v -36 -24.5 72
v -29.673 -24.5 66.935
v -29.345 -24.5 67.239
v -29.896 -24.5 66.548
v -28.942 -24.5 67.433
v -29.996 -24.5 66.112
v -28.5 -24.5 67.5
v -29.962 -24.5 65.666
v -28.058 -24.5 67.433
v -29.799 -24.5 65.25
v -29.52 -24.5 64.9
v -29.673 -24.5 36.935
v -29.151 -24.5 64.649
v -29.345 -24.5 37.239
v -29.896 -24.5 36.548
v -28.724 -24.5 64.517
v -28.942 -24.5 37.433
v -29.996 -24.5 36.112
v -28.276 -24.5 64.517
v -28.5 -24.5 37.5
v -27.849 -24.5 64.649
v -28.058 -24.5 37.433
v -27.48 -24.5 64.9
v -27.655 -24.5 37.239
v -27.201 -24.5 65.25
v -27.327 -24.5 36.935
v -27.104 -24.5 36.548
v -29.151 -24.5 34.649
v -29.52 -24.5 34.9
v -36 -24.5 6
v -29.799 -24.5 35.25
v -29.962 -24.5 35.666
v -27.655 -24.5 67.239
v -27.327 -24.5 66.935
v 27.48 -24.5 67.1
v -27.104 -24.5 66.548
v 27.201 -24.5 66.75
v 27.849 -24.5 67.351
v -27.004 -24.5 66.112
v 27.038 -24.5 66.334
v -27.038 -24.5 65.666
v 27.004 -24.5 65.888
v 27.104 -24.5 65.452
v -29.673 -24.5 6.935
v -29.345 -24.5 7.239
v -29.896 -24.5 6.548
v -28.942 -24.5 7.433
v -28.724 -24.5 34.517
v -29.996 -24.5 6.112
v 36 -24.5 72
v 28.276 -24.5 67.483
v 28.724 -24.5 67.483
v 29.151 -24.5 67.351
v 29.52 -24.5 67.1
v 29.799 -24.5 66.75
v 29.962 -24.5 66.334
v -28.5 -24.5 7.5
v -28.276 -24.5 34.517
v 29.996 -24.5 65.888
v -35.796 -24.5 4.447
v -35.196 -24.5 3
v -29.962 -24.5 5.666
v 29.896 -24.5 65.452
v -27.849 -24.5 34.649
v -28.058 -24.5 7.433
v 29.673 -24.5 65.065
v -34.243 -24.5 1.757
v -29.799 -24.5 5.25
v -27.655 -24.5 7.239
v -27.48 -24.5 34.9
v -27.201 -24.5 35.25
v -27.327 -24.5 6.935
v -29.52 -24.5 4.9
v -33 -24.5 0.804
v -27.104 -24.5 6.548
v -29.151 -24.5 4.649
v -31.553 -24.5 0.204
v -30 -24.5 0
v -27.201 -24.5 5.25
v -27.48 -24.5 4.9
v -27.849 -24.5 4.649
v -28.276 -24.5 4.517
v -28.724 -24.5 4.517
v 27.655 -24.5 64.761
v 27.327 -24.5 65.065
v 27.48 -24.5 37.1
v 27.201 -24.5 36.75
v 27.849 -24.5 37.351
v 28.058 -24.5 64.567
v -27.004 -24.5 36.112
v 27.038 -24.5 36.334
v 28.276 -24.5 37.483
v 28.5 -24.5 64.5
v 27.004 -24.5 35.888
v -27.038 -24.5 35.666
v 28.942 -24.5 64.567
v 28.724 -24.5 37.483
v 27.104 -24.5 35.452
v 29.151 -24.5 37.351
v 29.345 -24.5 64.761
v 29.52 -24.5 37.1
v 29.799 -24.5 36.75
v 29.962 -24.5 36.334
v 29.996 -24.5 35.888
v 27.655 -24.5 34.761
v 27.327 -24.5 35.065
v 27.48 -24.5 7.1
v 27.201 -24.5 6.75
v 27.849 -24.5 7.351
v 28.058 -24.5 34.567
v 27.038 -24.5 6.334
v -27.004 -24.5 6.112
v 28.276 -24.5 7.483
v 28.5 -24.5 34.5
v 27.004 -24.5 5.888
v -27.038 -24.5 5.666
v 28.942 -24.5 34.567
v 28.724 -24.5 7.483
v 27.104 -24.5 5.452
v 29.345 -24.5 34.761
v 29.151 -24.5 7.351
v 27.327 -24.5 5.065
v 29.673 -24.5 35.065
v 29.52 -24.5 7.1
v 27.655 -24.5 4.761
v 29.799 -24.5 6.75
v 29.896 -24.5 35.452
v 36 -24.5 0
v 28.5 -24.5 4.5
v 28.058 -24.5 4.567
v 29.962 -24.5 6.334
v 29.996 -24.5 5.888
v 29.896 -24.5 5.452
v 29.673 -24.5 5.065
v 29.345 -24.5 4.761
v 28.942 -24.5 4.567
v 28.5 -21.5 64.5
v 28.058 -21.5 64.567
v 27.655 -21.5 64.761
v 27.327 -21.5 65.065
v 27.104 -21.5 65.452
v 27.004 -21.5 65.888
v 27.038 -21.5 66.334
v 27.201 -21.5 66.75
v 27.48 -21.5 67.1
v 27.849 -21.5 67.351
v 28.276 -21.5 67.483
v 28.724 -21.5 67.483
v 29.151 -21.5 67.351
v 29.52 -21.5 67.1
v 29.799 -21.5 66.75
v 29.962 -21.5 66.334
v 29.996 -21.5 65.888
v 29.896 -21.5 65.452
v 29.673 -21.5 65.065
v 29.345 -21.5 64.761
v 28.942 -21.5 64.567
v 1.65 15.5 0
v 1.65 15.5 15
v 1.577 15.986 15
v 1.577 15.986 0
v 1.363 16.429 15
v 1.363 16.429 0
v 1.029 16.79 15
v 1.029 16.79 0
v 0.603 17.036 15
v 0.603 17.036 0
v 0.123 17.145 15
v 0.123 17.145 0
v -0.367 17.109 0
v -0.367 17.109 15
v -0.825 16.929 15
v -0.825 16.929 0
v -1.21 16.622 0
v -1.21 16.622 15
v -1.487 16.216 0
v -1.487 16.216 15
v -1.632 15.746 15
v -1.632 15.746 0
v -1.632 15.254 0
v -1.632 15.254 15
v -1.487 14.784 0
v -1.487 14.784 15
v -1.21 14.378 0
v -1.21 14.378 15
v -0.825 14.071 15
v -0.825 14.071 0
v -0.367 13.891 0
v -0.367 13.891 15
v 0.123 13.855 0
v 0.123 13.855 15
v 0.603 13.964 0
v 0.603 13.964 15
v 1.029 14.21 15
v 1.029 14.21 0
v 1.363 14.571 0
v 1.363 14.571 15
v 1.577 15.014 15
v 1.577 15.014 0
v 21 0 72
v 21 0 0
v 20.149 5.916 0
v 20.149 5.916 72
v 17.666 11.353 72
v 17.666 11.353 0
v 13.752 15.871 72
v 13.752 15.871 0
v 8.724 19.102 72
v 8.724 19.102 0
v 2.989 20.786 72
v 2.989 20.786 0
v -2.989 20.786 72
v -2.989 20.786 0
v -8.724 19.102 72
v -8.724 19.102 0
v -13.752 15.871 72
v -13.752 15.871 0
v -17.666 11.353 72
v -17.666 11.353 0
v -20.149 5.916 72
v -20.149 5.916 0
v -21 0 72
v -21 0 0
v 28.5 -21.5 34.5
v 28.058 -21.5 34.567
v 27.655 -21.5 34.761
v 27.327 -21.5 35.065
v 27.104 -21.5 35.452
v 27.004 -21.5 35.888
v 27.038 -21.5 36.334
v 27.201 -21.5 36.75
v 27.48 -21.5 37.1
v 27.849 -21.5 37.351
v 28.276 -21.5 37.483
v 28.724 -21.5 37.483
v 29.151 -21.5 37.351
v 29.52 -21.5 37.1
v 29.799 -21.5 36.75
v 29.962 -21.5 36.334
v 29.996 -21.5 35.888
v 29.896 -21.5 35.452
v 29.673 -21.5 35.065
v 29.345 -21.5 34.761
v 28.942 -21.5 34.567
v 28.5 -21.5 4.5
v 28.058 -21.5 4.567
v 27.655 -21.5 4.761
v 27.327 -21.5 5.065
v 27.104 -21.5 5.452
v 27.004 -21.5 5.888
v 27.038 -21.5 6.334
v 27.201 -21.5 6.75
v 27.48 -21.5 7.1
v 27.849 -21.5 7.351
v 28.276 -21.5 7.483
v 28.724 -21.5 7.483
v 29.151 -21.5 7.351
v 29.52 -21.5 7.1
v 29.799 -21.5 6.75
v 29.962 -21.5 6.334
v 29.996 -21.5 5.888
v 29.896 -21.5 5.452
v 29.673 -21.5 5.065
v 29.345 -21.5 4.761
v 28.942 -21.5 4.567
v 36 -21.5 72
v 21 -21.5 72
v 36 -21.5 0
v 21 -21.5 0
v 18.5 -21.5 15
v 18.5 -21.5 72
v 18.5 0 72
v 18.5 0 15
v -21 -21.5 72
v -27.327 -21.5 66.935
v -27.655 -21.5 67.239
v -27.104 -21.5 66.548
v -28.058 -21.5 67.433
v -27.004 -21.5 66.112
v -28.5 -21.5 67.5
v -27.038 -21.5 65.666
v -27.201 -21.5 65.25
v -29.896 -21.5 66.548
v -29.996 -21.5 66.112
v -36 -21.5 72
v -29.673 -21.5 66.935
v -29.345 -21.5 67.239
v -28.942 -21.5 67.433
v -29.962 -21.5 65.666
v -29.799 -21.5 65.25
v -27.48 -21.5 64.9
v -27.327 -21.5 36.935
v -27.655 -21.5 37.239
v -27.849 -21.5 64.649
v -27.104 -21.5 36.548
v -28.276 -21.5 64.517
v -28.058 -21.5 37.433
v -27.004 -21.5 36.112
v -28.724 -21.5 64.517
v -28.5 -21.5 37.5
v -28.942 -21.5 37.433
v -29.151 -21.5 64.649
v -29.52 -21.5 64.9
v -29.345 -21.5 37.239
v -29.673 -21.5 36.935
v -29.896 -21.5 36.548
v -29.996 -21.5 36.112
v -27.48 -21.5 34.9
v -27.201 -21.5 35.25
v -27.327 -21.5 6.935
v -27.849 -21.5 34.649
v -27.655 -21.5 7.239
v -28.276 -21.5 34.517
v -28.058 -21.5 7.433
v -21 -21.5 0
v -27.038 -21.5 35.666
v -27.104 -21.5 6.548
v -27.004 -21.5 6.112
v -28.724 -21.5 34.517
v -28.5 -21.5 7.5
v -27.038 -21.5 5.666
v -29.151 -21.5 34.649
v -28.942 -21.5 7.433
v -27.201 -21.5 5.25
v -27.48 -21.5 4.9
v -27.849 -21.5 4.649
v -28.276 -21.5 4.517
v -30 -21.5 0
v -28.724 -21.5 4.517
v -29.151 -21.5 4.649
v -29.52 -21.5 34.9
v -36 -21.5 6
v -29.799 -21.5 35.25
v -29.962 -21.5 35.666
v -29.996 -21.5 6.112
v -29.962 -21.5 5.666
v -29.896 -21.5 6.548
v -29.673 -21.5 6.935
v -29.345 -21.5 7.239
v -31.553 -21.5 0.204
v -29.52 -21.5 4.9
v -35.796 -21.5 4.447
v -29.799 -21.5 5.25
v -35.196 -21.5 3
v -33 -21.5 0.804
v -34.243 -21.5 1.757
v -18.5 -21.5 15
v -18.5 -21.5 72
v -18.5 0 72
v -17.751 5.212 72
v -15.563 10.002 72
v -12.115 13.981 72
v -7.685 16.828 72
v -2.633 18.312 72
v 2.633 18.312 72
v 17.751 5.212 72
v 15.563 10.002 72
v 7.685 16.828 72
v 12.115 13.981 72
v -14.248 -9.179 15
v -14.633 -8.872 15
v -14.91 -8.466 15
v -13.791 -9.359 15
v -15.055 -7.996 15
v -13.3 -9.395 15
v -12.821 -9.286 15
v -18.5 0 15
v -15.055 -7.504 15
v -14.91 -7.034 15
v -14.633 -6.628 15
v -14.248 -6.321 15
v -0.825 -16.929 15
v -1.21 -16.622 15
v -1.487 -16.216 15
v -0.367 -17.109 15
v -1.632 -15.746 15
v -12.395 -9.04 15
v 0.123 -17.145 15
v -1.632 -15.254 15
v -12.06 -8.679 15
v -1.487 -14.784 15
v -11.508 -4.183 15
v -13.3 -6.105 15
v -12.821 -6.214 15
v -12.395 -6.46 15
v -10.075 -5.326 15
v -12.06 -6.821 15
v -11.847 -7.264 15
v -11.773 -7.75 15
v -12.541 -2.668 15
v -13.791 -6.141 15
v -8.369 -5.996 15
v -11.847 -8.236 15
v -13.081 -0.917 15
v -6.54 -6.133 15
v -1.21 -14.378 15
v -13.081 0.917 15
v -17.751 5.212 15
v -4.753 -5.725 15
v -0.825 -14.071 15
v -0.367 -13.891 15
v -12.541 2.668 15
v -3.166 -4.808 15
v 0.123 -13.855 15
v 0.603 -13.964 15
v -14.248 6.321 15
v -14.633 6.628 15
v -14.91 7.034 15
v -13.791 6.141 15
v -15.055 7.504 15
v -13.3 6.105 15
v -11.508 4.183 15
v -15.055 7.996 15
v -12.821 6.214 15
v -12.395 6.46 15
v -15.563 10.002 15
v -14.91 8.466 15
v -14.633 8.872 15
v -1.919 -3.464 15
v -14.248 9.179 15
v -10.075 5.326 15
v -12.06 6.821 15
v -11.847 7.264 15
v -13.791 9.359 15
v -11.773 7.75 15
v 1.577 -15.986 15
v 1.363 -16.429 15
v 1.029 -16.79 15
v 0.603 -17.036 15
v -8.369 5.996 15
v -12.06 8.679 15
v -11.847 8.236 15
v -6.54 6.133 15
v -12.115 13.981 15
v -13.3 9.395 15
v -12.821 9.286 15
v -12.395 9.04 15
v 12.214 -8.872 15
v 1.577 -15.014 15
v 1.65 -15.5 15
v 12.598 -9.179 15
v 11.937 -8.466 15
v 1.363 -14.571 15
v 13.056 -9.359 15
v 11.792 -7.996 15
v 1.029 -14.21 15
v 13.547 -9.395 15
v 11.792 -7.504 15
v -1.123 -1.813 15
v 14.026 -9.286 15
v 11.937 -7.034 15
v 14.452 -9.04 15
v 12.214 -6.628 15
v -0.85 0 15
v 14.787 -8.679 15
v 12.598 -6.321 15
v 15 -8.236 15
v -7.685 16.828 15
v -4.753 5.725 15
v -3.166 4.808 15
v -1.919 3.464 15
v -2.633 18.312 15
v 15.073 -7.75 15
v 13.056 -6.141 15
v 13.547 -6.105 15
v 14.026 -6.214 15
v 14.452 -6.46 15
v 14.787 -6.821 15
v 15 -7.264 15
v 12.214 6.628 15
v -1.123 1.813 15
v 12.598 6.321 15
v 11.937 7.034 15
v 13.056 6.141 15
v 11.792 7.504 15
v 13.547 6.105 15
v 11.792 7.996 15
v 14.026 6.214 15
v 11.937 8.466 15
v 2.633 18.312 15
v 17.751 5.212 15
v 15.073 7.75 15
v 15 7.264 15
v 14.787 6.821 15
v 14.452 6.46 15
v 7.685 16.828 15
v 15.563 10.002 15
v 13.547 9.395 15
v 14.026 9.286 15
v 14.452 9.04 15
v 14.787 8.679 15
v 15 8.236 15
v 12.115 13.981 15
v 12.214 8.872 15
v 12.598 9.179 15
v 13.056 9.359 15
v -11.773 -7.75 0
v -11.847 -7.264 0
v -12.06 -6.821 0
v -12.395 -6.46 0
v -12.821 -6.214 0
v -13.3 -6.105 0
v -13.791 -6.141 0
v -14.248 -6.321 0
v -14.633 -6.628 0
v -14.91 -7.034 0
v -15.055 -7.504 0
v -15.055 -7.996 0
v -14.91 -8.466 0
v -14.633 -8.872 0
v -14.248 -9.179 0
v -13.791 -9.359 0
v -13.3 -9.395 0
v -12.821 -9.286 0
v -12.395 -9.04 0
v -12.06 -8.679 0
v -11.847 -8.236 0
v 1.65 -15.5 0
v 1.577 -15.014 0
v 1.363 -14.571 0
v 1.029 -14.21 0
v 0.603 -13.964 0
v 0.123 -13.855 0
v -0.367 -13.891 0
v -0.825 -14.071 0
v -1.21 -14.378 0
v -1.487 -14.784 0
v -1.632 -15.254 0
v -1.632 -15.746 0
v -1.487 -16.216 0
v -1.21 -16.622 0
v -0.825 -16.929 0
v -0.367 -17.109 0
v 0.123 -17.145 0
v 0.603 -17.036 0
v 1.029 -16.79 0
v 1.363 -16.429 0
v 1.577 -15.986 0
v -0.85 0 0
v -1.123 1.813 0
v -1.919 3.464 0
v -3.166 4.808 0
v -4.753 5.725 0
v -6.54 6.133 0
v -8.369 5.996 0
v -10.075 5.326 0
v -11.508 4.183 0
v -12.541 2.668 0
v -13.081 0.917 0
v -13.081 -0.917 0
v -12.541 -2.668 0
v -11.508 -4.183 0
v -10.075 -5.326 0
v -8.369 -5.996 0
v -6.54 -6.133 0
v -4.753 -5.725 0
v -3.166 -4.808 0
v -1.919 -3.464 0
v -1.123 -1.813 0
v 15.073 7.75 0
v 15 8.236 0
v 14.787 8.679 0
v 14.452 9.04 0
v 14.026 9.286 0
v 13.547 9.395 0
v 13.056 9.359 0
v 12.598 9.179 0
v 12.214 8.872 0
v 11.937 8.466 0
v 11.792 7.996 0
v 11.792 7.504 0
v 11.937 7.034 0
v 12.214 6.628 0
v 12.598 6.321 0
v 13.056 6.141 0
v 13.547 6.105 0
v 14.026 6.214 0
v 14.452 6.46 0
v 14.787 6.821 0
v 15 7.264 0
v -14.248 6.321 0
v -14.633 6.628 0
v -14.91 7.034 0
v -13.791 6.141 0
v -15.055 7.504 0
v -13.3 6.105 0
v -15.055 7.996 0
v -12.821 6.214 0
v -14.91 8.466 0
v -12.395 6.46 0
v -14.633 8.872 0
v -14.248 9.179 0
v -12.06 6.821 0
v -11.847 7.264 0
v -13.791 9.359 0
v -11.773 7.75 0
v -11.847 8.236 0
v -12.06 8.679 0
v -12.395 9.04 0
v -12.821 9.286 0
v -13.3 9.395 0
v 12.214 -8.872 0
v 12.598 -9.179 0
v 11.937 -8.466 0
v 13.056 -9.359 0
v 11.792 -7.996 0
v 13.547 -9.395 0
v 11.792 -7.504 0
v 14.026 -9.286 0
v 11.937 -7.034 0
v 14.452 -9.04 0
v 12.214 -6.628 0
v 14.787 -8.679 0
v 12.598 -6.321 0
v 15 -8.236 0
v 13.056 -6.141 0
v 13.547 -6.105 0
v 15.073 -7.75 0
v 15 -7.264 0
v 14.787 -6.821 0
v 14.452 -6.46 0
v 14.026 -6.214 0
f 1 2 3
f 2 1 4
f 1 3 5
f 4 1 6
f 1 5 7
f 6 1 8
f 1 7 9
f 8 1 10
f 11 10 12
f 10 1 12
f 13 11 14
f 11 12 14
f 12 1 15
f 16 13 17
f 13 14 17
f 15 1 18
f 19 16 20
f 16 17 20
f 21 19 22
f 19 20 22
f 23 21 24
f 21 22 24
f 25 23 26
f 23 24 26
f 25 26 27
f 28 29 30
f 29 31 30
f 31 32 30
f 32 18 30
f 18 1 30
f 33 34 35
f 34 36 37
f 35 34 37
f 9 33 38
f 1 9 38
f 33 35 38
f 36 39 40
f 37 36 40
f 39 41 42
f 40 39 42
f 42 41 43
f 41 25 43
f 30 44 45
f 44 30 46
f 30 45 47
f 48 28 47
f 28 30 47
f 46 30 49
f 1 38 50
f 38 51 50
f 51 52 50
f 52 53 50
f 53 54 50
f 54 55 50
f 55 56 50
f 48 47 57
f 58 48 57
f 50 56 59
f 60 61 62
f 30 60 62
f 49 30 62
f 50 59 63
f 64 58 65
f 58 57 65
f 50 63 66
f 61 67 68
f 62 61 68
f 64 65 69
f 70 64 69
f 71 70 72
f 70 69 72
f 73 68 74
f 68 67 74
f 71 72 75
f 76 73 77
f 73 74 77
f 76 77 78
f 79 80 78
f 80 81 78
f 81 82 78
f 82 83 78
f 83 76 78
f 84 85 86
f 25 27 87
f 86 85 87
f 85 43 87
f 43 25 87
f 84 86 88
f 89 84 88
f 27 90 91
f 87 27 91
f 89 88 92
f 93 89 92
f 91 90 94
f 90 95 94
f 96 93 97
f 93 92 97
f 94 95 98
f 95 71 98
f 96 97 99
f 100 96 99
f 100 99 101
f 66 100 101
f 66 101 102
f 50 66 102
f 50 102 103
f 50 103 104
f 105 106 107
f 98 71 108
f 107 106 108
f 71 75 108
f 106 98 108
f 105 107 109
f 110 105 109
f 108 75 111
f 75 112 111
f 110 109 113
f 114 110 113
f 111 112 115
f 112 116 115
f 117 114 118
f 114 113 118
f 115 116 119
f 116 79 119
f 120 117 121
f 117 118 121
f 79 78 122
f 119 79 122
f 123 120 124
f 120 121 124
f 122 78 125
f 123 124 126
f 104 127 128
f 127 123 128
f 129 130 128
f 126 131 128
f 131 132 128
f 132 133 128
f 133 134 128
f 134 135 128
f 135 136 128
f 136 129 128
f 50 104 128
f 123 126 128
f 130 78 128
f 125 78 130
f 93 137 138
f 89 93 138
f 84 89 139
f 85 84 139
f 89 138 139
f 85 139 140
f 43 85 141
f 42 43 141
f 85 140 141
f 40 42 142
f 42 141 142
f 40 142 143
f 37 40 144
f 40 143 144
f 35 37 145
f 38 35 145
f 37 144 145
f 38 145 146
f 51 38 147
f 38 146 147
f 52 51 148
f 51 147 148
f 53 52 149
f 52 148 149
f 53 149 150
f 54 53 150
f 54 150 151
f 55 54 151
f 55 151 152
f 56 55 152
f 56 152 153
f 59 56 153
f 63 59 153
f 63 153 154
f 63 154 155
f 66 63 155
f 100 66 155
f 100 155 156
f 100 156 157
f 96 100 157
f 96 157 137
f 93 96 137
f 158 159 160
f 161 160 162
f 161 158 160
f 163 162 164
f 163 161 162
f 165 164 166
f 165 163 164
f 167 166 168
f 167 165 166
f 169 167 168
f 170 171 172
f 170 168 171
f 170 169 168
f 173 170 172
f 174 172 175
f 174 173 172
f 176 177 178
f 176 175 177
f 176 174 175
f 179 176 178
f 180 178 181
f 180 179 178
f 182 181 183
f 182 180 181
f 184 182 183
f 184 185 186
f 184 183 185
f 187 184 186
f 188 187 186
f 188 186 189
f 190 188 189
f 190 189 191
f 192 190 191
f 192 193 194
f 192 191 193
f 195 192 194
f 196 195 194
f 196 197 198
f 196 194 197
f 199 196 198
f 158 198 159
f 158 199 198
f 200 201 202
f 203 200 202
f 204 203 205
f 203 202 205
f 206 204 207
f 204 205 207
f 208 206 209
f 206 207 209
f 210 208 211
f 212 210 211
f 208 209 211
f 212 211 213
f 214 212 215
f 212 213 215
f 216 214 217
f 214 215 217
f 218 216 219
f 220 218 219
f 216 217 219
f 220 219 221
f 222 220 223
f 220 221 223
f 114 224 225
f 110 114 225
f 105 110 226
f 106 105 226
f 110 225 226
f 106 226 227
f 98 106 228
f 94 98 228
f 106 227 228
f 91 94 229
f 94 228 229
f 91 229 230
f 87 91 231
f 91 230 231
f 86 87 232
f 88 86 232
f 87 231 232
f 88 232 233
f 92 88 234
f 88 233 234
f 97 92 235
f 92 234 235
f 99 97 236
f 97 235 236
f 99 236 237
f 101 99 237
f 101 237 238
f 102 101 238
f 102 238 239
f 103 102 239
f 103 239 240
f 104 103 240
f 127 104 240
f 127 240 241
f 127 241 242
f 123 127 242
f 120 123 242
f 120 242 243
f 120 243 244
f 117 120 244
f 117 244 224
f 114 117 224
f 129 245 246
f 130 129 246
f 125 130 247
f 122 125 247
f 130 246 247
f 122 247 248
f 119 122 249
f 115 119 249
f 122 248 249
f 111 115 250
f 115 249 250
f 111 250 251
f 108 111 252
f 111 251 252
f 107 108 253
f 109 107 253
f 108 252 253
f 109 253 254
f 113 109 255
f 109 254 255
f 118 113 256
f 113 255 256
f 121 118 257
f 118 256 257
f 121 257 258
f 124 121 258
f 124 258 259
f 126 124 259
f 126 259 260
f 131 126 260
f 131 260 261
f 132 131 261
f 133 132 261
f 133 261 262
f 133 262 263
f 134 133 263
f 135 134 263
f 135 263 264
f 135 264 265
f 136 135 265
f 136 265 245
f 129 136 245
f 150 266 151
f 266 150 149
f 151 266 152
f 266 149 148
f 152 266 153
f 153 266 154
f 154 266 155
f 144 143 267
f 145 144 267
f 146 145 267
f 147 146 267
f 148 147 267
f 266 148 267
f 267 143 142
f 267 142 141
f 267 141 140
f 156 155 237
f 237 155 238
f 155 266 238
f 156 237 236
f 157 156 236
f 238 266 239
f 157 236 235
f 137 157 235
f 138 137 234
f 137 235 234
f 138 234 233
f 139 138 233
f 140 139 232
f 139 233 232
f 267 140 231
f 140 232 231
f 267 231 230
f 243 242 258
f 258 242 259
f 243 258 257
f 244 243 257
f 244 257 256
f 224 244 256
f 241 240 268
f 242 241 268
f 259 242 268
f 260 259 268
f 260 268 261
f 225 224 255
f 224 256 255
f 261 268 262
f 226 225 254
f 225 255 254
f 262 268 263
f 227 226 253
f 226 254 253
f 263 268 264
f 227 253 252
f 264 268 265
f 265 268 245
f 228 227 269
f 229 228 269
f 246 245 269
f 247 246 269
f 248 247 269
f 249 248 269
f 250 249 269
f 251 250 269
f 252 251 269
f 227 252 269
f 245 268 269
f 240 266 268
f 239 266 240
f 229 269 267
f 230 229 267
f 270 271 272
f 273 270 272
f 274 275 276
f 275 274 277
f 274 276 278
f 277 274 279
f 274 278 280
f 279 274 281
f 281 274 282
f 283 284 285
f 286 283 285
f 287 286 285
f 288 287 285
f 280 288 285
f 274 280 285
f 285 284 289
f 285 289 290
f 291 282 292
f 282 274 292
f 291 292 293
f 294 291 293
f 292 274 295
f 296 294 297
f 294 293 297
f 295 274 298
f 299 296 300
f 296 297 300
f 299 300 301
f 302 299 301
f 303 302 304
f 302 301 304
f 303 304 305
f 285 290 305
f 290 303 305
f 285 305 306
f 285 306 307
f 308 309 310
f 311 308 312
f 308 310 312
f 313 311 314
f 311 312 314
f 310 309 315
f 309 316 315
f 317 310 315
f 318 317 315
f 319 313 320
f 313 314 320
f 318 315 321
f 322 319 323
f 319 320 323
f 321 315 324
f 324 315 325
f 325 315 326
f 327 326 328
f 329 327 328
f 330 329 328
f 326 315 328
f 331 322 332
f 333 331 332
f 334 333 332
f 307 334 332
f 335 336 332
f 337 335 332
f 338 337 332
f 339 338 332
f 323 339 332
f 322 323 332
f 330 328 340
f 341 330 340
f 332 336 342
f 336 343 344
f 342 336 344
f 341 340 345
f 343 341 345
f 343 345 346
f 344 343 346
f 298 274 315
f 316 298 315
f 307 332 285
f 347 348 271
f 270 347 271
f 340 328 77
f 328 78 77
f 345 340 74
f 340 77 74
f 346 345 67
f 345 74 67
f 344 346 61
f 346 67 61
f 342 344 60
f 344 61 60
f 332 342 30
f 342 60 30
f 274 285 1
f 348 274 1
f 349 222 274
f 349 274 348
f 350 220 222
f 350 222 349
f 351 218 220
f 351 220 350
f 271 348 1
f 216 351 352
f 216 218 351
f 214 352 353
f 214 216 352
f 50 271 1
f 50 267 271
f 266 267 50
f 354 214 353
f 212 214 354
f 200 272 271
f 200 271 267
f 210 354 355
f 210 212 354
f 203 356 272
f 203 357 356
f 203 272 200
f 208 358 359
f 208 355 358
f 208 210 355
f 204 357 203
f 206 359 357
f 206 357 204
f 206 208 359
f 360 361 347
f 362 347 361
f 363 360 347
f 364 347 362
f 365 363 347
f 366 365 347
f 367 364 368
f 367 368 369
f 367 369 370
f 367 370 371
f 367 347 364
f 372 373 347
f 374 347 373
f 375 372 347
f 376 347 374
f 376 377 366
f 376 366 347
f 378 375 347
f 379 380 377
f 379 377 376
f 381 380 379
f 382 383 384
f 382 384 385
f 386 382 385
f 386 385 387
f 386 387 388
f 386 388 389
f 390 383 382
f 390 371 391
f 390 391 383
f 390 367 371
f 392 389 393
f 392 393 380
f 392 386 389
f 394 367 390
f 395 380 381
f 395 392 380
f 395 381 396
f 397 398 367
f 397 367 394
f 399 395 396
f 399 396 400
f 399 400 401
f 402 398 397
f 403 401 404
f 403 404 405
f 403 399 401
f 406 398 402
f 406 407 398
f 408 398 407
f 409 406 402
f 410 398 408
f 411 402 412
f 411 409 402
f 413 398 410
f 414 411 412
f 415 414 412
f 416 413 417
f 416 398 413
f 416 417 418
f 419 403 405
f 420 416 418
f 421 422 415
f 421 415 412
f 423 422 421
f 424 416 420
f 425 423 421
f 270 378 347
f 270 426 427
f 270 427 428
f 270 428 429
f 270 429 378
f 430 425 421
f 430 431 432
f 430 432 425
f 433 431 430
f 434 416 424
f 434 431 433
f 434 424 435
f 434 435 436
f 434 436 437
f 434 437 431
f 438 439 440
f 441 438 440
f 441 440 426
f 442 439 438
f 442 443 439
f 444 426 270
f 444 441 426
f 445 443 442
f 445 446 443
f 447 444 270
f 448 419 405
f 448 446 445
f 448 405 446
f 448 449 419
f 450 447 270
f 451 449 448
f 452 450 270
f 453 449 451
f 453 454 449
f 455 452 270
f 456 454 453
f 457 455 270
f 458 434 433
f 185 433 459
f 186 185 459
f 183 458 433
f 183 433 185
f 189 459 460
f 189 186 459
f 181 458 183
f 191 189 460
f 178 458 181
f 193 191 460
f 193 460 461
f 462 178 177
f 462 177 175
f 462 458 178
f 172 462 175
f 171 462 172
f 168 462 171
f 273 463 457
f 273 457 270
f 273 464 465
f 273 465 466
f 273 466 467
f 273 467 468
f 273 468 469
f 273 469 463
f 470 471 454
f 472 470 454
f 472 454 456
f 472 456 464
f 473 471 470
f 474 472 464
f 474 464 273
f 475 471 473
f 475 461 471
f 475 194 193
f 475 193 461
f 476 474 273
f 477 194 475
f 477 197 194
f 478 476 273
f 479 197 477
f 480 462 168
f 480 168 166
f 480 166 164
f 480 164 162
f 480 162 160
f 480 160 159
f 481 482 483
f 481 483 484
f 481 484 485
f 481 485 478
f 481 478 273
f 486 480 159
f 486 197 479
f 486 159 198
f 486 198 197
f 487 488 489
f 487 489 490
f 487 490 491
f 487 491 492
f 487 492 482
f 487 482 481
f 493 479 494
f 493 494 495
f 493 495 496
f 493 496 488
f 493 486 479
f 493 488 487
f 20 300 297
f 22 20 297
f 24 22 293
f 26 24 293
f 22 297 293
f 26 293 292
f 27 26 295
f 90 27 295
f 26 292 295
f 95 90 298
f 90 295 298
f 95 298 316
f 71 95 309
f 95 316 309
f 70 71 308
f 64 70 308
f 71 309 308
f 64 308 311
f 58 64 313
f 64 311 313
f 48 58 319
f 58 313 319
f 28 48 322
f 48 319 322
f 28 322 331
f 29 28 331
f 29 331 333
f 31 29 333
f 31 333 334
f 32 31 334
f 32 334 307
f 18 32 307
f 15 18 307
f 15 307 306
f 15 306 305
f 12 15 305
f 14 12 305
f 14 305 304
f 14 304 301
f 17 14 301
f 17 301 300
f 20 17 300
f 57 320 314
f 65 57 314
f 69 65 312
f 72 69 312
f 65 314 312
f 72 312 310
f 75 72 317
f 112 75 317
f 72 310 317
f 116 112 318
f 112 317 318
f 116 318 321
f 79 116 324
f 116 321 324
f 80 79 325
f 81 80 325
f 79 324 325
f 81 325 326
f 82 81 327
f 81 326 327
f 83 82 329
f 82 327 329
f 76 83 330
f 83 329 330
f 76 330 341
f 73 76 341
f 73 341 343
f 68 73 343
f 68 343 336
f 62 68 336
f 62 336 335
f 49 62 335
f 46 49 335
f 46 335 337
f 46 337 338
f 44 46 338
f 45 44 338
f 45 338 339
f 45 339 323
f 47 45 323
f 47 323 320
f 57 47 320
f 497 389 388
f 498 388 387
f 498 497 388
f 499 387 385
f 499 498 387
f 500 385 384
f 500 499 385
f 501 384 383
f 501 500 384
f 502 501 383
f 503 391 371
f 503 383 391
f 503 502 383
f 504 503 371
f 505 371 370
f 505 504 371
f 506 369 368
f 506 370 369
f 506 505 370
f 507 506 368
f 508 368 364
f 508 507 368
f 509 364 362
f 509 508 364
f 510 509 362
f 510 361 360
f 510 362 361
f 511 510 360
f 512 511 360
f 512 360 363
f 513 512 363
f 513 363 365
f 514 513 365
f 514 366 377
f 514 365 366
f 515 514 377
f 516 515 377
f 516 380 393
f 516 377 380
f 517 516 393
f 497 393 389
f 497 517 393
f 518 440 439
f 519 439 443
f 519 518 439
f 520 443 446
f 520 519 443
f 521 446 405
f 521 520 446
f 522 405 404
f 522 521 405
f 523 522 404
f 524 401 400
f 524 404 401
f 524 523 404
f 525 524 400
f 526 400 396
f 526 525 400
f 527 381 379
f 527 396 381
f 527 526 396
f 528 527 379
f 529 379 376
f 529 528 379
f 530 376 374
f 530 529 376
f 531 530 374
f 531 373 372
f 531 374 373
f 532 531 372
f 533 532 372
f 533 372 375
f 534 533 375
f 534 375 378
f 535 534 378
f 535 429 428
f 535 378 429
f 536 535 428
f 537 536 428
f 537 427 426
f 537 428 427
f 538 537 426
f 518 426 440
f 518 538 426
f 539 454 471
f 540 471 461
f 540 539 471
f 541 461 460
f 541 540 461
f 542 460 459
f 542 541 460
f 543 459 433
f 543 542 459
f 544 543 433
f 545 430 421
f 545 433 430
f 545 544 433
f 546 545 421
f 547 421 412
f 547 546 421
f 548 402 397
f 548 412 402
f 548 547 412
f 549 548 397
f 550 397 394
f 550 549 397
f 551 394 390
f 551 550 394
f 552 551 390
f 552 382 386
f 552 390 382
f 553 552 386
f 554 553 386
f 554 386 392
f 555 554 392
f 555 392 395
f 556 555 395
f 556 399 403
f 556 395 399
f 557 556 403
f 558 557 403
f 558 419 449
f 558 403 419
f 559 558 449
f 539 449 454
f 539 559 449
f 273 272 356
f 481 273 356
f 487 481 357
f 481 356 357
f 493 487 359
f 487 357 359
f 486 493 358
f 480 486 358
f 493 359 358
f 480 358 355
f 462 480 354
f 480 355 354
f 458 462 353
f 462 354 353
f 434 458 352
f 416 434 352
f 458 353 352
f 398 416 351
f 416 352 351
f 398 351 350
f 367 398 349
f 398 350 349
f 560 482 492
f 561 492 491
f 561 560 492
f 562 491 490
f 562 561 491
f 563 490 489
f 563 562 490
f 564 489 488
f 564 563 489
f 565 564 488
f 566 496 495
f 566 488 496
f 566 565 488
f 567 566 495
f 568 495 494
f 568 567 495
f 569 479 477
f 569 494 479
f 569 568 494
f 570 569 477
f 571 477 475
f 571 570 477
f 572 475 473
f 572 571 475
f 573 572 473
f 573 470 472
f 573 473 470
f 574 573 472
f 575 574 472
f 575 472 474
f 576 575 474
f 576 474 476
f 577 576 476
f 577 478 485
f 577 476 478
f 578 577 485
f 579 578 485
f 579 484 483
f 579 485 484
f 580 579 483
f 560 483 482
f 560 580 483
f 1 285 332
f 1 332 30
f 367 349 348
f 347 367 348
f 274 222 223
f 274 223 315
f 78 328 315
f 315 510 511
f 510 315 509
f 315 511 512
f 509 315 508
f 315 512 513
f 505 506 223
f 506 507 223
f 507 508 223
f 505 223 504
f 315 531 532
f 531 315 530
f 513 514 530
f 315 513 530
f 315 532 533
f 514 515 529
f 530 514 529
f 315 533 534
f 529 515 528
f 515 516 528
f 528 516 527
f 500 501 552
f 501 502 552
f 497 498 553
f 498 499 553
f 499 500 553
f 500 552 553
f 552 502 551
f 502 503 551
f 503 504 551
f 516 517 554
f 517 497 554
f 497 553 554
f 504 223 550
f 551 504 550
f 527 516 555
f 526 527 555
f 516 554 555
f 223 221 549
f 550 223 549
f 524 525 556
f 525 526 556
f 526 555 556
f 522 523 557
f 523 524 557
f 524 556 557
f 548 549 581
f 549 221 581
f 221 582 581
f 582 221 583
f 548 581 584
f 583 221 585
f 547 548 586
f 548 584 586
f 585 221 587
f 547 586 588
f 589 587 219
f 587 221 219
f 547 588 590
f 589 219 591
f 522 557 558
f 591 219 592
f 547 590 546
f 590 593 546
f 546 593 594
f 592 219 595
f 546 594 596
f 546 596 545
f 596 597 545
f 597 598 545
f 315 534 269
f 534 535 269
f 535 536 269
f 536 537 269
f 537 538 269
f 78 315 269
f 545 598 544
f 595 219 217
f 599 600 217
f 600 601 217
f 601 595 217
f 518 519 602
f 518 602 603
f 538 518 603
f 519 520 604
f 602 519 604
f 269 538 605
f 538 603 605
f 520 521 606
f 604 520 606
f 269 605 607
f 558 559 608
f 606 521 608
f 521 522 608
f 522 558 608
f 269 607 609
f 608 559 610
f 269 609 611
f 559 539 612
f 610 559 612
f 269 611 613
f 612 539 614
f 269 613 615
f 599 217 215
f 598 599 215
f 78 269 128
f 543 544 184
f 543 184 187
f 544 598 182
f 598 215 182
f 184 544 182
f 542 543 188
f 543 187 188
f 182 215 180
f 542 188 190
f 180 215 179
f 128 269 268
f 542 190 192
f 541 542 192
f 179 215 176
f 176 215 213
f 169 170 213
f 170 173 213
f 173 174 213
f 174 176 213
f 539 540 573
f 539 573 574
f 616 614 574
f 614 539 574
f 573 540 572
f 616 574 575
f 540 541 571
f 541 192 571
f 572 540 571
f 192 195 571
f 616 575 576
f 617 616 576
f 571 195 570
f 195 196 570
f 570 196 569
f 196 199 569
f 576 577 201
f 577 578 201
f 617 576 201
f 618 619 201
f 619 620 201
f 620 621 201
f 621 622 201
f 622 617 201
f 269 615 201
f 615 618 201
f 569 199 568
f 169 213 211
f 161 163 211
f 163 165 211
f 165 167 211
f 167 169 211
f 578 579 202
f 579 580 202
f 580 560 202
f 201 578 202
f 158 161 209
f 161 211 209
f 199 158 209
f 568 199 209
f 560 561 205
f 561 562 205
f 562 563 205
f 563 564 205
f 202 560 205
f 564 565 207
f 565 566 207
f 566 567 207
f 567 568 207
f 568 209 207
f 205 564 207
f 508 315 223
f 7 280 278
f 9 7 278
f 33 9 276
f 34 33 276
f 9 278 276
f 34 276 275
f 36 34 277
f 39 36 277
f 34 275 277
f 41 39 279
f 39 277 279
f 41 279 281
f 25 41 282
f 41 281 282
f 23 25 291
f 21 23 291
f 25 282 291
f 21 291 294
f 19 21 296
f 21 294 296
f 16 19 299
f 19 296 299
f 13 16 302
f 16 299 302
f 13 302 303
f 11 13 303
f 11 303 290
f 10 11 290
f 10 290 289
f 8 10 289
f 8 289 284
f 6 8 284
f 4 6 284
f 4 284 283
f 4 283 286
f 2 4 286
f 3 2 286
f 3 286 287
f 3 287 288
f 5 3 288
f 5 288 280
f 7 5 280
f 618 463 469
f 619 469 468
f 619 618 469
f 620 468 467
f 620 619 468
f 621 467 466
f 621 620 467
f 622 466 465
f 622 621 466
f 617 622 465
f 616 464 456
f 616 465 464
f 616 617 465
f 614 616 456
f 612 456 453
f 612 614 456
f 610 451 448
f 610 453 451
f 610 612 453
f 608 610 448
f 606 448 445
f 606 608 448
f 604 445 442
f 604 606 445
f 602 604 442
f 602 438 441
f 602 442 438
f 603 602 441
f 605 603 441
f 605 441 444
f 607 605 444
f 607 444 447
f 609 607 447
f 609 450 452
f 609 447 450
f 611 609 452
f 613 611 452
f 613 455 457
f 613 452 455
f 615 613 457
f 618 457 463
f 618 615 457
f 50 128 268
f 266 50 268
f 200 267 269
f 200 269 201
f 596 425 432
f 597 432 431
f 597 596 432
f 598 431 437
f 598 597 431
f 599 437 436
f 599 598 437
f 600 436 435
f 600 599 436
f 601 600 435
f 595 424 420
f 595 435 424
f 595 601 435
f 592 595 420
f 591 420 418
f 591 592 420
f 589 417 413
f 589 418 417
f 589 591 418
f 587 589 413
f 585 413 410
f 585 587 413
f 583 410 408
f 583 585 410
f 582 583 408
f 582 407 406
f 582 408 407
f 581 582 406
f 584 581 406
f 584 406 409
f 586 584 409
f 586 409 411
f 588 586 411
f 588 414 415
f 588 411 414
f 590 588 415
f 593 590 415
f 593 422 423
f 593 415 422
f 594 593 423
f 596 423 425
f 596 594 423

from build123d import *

# Parameters (mm, degrees)
SKETCH1_R           = 1.65
SKETCH1_R_2         = 6.15
BOSS_EXTRUDE1_DEPTH = 72
CUT_EXTRUDE1_DEPTH  = 57
SKETCH3_R           = 1.5
CUT_EXTRUDE2_DEPTH  = 92.028841583
FILLET1_R           = 6


with BuildPart() as part:
    # Sketch1 → Boss-Extrude1 (new body)
    with BuildSketch(Plane.XY):
        with BuildLine():
            Line((-21, 0), (-21, -21.5))
            Line((-21, -21.5), (-36, -21.5))
            Line((-36, -21.5), (-36, -24.5))
            Line((-36, -24.5), (36, -24.5))
            Line((36, -24.5), (36, -21.5))
            Line((36, -21.5), (21, -21.5))
            Line((21, -21.5), (21, 0))
            ThreePointArc((21, 0), (0, 21), (-21, 0))
        make_face()
        with Locations((0, -15.5)):
            Circle(SKETCH1_R, mode=Mode.SUBTRACT)
        with Locations((-13.423393759, -7.75)):
            Circle(SKETCH1_R, mode=Mode.SUBTRACT)
        with Locations((-13.423393759, 7.75)):
            Circle(SKETCH1_R, mode=Mode.SUBTRACT)
        with Locations((0, 15.5)):
            Circle(SKETCH1_R, mode=Mode.SUBTRACT)
        with Locations((13.423393759, 7.75)):
            Circle(SKETCH1_R, mode=Mode.SUBTRACT)
        with Locations((13.423393759, -7.75)):
            Circle(SKETCH1_R, mode=Mode.SUBTRACT)
        with Locations((-7, 0)):
            Circle(SKETCH1_R_2, mode=Mode.SUBTRACT)
    extrude(amount=BOSS_EXTRUDE1_DEPTH)

    # Sketch2 → Cut-Extrude1 (cut)
    with BuildSketch(Plane.XY.offset(72)):
        with BuildLine():
            Line((-18.5, 0), (-18.5, -21.5))
            Line((-18.5, -21.5), (18.5, -21.5))
            Line((18.5, -21.5), (18.5, 0))
            ThreePointArc((18.5, 0), (0, 18.5), (-18.5, 0))
        make_face()
    extrude(amount=-CUT_EXTRUDE1_DEPTH, mode=Mode.SUBTRACT)

    # Sketch3 → Cut-Extrude2 (cut, through all)
    with BuildSketch(Plane(origin=(0, -21.5, 0), x_dir=(1, 0, 0), z_dir=(0, 1, 0))):
        with Locations(Location((-28.5, -36, 0), (0, 0, 270))):
            Circle(SKETCH3_R)
        with Locations(Location((-28.5, -6, 0), (0, 0, 270))):
            Circle(SKETCH3_R)
        with Locations(Location((-28.5, -66, 0), (0, 0, 270))):
            Circle(SKETCH3_R)
        with Locations(Location((28.5, -66, 0), (0, 0, 90))):
            Circle(SKETCH3_R)
        with Locations(Location((28.5, -6, 0), (0, 0, 90))):
            Circle(SKETCH3_R)
        with Locations(Location((28.5, -36, 0), (0, 0, 90))):
            Circle(SKETCH3_R)
    extrude(amount=-CUT_EXTRUDE2_DEPTH, mode=Mode.SUBTRACT)

    # Fillet1
    fillet1_edges = [part.edges().sort_by_distance(p)[0] for p in [
        (-36, -23, 0),
    ]]
    fillet(fillet1_edges, radius=FILLET1_R)


solid = part.part
